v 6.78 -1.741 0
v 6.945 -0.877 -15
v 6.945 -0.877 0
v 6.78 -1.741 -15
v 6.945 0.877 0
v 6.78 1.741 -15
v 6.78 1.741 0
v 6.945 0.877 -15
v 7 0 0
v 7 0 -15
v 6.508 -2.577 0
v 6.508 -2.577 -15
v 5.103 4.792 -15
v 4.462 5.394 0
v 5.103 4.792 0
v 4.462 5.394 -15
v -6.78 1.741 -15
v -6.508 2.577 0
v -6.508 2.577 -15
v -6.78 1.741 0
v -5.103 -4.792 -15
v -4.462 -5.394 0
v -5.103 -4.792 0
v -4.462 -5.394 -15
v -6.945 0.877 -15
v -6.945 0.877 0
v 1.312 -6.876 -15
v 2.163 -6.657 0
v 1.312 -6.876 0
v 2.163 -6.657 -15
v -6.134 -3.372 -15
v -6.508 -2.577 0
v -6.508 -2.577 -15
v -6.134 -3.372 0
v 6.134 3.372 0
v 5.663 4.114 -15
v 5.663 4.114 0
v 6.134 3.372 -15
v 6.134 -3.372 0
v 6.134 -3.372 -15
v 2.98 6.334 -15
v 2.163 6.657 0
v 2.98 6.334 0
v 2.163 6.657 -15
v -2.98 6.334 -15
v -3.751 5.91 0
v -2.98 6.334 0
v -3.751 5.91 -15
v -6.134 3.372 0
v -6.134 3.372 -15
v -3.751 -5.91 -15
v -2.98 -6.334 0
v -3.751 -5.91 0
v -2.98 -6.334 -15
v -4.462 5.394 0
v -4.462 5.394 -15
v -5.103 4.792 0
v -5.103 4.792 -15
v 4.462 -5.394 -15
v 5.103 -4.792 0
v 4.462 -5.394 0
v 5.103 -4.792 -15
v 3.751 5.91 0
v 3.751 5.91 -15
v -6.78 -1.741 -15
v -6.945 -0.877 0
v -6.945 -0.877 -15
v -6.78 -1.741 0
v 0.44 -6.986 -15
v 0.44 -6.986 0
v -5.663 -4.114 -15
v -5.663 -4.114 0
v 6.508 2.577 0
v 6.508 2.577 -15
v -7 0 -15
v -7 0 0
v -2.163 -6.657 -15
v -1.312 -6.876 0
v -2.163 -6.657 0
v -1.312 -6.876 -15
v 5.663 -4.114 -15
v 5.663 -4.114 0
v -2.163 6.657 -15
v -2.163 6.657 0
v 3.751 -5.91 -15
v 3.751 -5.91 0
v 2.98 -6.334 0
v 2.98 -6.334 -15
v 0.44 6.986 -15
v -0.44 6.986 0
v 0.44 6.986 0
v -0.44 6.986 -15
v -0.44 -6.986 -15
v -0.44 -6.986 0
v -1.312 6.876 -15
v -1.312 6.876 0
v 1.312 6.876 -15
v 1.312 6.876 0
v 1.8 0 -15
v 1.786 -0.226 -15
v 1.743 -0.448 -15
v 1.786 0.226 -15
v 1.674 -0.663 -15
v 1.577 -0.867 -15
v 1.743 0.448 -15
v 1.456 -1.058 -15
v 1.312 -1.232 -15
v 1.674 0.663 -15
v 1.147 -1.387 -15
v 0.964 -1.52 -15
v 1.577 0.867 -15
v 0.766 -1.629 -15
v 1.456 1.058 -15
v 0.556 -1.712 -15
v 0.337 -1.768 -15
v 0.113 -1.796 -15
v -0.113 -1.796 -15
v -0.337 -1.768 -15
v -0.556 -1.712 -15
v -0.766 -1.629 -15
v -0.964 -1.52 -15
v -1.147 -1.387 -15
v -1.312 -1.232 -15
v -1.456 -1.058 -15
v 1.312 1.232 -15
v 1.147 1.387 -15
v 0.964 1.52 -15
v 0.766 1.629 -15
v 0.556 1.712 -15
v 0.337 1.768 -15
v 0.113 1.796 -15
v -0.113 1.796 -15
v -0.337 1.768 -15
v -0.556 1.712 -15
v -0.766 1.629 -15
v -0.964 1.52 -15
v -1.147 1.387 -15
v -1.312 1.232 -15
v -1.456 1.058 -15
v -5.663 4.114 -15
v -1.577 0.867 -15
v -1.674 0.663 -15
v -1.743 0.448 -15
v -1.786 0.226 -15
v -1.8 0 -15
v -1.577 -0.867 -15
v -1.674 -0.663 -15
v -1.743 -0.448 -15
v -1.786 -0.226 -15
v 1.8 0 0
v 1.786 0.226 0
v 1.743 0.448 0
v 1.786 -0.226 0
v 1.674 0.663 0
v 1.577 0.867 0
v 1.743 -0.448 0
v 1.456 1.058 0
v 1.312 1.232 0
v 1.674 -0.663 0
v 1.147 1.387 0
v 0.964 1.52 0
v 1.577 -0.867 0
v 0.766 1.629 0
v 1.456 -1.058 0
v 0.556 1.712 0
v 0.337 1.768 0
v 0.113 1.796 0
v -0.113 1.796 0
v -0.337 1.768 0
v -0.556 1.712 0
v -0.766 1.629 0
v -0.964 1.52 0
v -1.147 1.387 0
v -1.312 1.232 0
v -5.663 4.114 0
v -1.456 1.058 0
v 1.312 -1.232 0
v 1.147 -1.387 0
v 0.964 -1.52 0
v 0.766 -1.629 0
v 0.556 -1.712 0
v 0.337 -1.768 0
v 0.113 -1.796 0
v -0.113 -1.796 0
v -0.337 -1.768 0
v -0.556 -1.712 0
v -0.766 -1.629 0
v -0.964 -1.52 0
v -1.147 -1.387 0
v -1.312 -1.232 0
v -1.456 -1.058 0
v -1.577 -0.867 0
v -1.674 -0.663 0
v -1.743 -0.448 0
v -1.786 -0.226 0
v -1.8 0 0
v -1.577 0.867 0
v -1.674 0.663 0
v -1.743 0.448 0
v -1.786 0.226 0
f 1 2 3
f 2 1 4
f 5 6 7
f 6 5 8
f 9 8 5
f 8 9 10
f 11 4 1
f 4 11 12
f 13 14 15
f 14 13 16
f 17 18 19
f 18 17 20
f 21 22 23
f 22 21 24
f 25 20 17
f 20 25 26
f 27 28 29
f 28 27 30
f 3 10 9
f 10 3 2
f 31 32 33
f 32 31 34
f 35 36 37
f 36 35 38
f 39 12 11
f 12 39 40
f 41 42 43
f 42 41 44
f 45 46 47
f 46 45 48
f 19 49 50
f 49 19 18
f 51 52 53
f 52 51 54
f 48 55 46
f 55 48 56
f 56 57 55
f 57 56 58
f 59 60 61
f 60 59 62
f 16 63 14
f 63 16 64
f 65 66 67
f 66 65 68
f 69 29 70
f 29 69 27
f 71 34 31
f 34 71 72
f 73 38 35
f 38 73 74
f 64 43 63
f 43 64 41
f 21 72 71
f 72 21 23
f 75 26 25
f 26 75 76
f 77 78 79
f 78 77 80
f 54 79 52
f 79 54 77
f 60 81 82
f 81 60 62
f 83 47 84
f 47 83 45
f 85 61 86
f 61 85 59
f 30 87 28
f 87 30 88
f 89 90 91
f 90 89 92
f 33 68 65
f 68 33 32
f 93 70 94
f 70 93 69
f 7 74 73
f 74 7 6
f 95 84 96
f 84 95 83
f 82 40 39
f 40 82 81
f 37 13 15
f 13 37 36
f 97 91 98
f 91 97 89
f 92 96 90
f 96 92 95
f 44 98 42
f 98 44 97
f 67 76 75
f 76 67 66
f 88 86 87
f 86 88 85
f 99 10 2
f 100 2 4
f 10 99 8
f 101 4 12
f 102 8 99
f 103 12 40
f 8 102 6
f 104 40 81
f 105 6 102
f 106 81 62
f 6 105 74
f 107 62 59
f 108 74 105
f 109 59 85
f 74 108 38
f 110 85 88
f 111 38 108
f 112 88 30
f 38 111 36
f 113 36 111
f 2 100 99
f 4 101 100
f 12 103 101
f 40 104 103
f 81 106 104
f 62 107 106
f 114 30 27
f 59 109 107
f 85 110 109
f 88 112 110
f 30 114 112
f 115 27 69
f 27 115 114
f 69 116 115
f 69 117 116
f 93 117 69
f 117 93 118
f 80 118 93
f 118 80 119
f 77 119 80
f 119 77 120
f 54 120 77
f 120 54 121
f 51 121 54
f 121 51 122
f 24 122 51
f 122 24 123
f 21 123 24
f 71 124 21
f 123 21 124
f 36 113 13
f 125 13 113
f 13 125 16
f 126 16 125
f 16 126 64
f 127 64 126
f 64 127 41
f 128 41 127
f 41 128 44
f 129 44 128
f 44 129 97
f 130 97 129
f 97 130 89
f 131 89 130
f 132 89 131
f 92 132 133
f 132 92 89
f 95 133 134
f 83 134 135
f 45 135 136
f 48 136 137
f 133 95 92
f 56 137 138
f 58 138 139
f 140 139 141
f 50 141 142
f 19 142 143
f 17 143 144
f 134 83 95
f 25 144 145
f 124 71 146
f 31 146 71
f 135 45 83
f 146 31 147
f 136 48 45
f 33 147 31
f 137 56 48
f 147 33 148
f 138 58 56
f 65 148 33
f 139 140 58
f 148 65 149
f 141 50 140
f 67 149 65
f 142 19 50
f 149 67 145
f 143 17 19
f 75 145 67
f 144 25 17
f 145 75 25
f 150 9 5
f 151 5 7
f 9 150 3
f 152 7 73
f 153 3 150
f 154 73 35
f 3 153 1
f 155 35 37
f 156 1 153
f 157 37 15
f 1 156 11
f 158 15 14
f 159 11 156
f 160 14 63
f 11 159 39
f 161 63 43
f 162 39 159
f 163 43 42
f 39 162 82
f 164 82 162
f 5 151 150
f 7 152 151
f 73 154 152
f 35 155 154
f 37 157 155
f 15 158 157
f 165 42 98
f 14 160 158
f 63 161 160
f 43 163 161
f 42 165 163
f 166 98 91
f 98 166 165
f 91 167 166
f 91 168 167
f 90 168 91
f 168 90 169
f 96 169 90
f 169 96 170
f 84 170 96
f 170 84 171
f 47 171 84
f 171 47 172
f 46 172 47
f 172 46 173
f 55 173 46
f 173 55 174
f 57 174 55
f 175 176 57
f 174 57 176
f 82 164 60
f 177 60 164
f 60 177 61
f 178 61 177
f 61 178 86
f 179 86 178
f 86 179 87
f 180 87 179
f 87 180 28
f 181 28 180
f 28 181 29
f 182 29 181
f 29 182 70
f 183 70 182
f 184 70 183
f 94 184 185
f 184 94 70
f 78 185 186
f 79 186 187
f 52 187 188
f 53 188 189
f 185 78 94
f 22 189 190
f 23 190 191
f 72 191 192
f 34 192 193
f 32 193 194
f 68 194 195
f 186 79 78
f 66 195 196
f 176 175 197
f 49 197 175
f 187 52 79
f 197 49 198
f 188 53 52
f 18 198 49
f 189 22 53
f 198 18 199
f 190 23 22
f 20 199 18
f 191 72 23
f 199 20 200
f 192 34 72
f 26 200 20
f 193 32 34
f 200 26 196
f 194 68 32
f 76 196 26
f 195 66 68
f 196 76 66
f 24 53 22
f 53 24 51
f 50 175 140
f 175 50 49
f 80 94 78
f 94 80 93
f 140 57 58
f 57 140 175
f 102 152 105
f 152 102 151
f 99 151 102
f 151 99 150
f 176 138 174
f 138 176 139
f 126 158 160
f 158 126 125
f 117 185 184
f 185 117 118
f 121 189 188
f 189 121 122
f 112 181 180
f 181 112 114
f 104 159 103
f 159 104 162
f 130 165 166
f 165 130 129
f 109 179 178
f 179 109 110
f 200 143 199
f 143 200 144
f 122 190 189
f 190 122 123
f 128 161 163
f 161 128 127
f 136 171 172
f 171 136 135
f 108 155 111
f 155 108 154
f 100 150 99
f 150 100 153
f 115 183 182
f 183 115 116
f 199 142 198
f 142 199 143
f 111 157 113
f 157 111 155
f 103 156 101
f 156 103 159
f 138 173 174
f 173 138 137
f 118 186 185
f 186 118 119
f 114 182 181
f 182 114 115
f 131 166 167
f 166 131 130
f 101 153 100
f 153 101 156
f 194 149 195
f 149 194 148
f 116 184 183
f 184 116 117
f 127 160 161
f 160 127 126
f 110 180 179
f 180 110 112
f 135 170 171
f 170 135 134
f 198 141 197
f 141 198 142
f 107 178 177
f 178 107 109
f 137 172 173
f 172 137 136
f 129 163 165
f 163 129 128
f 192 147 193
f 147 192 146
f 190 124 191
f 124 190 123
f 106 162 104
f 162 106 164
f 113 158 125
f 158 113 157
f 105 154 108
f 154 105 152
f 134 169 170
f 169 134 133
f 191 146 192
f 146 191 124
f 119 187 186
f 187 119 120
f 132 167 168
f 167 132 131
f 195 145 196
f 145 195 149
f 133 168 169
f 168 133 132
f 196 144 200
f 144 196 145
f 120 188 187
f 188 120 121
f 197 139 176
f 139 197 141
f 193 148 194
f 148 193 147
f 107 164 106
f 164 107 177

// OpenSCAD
$fn = 50;


difference() {
	union() {
		translate(v = [0, 0, -15.0000000000]) {
			cylinder(h = 15, r = 7.0000000000);
		}
	}
	union() {
		#translate(v = [0, 0, -15]) {
			cylinder(h = 15, r = 1.8000000000);
		}
	}
}
